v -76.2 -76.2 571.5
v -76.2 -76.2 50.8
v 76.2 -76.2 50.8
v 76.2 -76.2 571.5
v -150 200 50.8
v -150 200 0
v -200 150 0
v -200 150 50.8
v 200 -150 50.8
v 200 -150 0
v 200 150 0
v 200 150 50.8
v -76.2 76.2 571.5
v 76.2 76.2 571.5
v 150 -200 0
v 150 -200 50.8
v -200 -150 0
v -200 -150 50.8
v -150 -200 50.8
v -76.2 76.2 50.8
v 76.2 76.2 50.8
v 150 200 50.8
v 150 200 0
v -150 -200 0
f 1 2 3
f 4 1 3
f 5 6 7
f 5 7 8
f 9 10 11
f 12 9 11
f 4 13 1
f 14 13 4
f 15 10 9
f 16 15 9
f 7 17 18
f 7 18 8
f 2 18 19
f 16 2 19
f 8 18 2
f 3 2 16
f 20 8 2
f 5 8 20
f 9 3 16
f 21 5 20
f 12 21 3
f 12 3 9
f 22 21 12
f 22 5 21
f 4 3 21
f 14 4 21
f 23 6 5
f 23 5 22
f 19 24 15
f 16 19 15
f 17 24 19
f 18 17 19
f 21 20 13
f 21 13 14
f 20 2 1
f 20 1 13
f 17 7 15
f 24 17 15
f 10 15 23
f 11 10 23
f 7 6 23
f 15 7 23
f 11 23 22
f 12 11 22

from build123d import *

# Parameters (mm, degrees)
F0_W     = 400
F0_H     = 400
F1_DEPTH = 50.8
F2_SIZE  = 50
F3_W     = 152.4
F3_H     = 152.4
F4_DEPTH = 520.7


with BuildPart() as f1:
    # F0 (on Top) → F1 (new body)
    with BuildSketch(Plane.XY):
        Rectangle(F0_W, F0_H)
    extrude(amount=F1_DEPTH)

    # F2
    f2_edges = [f1.edges().sort_by_distance(p)[0] for p in [
        (-200, 200, 25.4),
        (-200, -200, 25.4),
        (200, -200, 25.4),
        (200, 200, 25.4),
    ]]
    chamfer(f2_edges, length=F2_SIZE)

    # F3 (on face) → F4 (join)
    with BuildSketch(Plane.XY.offset(50.8)):
        Rectangle(F3_W, F3_H)
    extrude(amount=F4_DEPTH)


solid = f1.part
